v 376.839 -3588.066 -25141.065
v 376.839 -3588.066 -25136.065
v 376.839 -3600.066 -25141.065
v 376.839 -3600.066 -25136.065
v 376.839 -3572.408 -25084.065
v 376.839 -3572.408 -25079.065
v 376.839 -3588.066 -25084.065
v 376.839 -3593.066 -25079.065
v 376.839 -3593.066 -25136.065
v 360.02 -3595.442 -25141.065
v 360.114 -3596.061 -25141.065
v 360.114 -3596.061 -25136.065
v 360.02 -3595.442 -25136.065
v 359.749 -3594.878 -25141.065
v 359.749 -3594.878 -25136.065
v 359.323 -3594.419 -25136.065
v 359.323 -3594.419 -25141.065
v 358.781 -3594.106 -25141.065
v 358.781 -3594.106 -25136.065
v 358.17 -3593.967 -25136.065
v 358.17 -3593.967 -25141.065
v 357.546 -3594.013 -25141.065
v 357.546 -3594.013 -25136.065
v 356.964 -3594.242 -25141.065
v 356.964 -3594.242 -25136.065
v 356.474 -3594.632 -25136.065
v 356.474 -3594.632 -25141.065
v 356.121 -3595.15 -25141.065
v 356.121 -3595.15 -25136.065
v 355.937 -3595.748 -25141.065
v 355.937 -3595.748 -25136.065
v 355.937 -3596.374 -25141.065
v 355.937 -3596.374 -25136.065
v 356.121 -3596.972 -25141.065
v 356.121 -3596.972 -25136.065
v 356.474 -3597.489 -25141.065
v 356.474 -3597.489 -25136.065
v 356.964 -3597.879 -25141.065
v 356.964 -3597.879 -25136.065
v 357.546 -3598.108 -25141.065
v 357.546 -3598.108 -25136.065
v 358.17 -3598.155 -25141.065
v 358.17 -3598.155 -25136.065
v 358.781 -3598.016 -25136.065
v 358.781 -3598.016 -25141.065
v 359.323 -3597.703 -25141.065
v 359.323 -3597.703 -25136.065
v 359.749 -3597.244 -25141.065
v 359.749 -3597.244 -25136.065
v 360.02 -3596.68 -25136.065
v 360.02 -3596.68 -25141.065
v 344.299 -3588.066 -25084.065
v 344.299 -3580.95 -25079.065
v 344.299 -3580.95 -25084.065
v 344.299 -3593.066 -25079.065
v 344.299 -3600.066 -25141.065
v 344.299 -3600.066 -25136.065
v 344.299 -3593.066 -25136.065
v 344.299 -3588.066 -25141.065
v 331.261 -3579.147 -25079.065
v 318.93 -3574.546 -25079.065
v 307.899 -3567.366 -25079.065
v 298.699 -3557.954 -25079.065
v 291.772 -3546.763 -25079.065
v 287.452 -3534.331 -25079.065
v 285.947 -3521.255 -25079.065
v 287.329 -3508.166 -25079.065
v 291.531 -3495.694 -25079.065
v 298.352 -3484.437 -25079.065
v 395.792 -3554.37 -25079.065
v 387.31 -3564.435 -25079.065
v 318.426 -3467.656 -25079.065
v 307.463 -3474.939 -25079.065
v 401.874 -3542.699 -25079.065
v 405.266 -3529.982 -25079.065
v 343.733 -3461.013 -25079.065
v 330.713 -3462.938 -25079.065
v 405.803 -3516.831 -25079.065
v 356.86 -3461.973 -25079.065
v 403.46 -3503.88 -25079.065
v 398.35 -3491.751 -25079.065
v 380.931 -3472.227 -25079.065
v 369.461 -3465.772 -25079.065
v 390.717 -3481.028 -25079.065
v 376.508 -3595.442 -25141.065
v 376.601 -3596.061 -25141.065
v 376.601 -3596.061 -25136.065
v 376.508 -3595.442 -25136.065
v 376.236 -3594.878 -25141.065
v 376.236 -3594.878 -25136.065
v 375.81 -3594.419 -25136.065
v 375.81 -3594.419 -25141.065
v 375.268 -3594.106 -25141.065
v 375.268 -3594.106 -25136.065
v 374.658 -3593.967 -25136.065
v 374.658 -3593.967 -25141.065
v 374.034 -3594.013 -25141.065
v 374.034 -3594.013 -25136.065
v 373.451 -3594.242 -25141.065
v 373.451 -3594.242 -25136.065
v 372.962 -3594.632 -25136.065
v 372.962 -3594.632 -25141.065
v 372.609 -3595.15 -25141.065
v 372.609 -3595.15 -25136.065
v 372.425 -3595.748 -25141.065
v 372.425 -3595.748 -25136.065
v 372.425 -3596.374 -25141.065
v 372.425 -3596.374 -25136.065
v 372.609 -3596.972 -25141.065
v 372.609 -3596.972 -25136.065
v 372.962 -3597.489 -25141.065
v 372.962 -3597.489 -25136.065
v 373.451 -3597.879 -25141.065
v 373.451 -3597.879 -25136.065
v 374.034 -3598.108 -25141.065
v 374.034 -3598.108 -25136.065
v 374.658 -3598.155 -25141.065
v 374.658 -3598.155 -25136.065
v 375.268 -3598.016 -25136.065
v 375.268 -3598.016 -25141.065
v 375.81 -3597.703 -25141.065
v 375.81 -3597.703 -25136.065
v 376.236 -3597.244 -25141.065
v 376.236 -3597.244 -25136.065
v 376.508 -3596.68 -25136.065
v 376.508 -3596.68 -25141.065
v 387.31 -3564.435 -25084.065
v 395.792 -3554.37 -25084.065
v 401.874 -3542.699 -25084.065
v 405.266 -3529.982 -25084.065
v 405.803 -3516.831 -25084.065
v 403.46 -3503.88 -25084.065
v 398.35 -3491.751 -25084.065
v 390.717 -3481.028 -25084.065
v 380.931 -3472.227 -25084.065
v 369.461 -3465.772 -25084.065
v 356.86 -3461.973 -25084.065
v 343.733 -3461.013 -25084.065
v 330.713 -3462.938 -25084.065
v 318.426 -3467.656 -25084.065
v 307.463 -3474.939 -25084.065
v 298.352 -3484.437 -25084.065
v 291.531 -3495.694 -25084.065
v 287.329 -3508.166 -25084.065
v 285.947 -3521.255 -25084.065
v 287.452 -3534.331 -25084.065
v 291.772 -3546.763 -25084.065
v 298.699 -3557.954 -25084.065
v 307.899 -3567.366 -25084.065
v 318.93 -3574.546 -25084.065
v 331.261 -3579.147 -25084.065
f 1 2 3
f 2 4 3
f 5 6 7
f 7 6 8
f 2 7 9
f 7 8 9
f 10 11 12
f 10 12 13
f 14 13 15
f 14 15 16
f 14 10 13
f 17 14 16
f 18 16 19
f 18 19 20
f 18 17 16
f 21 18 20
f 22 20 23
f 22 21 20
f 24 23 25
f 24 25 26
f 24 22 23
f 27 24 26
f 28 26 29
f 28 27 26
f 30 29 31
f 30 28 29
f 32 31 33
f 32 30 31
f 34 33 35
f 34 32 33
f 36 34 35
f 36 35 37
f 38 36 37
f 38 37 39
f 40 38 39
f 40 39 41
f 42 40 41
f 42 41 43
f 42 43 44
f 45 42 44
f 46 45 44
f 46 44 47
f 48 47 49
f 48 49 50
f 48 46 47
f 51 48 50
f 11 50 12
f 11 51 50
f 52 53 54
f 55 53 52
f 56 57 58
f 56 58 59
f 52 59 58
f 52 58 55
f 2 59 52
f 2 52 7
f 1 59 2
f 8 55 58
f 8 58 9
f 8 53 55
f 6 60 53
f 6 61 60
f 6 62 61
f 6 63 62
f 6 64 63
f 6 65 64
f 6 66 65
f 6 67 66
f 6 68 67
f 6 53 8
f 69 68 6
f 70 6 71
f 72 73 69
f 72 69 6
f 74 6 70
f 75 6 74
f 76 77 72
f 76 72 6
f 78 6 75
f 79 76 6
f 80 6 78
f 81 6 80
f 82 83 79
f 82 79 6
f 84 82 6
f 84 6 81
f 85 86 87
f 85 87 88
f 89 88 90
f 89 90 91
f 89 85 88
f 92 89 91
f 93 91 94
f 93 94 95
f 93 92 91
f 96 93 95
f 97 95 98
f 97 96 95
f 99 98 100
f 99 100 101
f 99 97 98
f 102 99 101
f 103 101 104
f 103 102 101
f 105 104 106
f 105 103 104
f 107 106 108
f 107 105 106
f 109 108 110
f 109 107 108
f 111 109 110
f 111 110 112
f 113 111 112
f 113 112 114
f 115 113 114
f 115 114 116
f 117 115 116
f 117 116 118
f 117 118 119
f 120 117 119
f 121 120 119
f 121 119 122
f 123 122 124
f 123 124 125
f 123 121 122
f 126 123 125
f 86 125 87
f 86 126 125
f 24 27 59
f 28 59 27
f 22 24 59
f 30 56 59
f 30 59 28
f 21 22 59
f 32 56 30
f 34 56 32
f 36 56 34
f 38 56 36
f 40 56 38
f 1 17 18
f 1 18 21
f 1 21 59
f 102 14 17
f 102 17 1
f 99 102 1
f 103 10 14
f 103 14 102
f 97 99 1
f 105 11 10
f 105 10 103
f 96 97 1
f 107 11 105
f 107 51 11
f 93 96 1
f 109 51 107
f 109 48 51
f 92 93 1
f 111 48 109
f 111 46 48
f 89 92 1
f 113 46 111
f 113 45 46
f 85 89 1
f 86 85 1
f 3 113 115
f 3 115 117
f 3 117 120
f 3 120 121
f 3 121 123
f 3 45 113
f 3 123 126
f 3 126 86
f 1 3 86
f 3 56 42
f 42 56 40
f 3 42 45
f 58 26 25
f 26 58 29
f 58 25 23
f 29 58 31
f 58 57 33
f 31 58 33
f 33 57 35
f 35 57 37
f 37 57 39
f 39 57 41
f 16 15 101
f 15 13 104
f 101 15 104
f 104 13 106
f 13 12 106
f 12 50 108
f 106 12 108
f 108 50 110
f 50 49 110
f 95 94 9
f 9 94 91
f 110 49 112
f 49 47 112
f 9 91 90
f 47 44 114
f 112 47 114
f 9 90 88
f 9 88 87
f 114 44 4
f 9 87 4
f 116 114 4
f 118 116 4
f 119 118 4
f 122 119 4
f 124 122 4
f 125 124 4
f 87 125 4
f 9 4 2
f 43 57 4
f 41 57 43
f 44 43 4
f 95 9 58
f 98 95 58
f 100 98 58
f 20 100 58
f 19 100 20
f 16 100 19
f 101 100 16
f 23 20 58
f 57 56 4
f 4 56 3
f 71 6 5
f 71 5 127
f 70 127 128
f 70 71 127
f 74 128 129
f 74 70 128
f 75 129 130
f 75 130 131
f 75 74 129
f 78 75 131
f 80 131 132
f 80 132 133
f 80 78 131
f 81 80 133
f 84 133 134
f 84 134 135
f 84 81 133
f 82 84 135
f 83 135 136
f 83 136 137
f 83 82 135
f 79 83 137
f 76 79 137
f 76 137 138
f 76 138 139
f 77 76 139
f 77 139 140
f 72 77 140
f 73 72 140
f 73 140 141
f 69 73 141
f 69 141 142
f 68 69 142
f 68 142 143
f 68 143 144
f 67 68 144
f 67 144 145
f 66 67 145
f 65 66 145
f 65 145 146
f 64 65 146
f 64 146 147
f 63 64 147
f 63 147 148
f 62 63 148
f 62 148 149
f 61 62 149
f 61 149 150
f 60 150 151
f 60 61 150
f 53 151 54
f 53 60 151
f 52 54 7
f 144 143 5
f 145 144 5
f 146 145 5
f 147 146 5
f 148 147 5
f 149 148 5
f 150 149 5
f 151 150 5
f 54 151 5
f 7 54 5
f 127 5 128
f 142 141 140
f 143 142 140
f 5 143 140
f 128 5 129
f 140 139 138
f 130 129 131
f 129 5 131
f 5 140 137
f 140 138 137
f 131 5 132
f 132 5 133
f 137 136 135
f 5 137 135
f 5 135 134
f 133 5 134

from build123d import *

# Parameters (mm, degrees)
SKETCH2_W           = 32.54
SKETCH2_H           = 8
SKETCH2_R           = 2.1
BOSS_EXTRUDE1_DEPTH = 5
SKETCH3_W           = 32.54
SKETCH3_H           = 5
BOSS_EXTRUDE2_DEPTH = 4
SKETCH4_W           = 32.539746062
SKETCH4_H           = 5
BOSS_EXTRUDE3_DEPTH = 57
SKETCH5_W           = 32.539746062
SKETCH5_H           = 5
BOSS_EXTRUDE4_DEPTH = 27.5
SKETCH7_R           = 60
BOSS_EXTRUDE6_DEPTH = 5


with BuildPart() as part:
    # Sketch2 → Boss-Extrude1 (new body)
    with BuildSketch(Plane.XY.offset(-25141.064740445)):
        with Locations((360.568878819, -3596.065695557)):
            Rectangle(SKETCH2_W, SKETCH2_H)
        with Locations((374.501060255, -3596.060789622)):
            Circle(SKETCH2_R, mode=Mode.SUBTRACT)
        with Locations((358.013502112, -3596.060789622)):
            Circle(SKETCH2_R, mode=Mode.SUBTRACT)
    extrude(amount=BOSS_EXTRUDE1_DEPTH)

    # Sketch3 → Boss-Extrude2 (add)
    with BuildSketch(Plane(origin=(0, -3592.065695557, 0), x_dir=(1, 0, 0), z_dir=(0, 1, 0))):
        with Locations((360.568878819, 25138.564740445)):
            Rectangle(SKETCH3_W, SKETCH3_H)
    extrude(amount=BOSS_EXTRUDE2_DEPTH)

    # Sketch4 → Boss-Extrude3 (add)
    with BuildSketch(Plane.XY.offset(-25136.064740445)):
        with Locations((360.56875185, -3590.565695557)):
            Rectangle(SKETCH4_W, SKETCH4_H)
    extrude(amount=BOSS_EXTRUDE3_DEPTH)

    # Sketch5 → Boss-Extrude4 (add)
    with BuildSketch(Plane(origin=(0, -3588.065695557, 0), x_dir=(1, 0, 0), z_dir=(0, 1, 0))):
        with Locations((360.56875185, 25081.564740445)):
            Rectangle(SKETCH5_W, SKETCH5_H)
    extrude(amount=BOSS_EXTRUDE4_DEPTH)

    # Sketch7 → Boss-Extrude6 (add)
    with BuildSketch(Plane.XY.offset(-25079.064740445)):
        with Locations((345.94627105, -3520.972176103)):
            Circle(SKETCH7_R)
    extrude(amount=-BOSS_EXTRUDE6_DEPTH)


solid = part.part
